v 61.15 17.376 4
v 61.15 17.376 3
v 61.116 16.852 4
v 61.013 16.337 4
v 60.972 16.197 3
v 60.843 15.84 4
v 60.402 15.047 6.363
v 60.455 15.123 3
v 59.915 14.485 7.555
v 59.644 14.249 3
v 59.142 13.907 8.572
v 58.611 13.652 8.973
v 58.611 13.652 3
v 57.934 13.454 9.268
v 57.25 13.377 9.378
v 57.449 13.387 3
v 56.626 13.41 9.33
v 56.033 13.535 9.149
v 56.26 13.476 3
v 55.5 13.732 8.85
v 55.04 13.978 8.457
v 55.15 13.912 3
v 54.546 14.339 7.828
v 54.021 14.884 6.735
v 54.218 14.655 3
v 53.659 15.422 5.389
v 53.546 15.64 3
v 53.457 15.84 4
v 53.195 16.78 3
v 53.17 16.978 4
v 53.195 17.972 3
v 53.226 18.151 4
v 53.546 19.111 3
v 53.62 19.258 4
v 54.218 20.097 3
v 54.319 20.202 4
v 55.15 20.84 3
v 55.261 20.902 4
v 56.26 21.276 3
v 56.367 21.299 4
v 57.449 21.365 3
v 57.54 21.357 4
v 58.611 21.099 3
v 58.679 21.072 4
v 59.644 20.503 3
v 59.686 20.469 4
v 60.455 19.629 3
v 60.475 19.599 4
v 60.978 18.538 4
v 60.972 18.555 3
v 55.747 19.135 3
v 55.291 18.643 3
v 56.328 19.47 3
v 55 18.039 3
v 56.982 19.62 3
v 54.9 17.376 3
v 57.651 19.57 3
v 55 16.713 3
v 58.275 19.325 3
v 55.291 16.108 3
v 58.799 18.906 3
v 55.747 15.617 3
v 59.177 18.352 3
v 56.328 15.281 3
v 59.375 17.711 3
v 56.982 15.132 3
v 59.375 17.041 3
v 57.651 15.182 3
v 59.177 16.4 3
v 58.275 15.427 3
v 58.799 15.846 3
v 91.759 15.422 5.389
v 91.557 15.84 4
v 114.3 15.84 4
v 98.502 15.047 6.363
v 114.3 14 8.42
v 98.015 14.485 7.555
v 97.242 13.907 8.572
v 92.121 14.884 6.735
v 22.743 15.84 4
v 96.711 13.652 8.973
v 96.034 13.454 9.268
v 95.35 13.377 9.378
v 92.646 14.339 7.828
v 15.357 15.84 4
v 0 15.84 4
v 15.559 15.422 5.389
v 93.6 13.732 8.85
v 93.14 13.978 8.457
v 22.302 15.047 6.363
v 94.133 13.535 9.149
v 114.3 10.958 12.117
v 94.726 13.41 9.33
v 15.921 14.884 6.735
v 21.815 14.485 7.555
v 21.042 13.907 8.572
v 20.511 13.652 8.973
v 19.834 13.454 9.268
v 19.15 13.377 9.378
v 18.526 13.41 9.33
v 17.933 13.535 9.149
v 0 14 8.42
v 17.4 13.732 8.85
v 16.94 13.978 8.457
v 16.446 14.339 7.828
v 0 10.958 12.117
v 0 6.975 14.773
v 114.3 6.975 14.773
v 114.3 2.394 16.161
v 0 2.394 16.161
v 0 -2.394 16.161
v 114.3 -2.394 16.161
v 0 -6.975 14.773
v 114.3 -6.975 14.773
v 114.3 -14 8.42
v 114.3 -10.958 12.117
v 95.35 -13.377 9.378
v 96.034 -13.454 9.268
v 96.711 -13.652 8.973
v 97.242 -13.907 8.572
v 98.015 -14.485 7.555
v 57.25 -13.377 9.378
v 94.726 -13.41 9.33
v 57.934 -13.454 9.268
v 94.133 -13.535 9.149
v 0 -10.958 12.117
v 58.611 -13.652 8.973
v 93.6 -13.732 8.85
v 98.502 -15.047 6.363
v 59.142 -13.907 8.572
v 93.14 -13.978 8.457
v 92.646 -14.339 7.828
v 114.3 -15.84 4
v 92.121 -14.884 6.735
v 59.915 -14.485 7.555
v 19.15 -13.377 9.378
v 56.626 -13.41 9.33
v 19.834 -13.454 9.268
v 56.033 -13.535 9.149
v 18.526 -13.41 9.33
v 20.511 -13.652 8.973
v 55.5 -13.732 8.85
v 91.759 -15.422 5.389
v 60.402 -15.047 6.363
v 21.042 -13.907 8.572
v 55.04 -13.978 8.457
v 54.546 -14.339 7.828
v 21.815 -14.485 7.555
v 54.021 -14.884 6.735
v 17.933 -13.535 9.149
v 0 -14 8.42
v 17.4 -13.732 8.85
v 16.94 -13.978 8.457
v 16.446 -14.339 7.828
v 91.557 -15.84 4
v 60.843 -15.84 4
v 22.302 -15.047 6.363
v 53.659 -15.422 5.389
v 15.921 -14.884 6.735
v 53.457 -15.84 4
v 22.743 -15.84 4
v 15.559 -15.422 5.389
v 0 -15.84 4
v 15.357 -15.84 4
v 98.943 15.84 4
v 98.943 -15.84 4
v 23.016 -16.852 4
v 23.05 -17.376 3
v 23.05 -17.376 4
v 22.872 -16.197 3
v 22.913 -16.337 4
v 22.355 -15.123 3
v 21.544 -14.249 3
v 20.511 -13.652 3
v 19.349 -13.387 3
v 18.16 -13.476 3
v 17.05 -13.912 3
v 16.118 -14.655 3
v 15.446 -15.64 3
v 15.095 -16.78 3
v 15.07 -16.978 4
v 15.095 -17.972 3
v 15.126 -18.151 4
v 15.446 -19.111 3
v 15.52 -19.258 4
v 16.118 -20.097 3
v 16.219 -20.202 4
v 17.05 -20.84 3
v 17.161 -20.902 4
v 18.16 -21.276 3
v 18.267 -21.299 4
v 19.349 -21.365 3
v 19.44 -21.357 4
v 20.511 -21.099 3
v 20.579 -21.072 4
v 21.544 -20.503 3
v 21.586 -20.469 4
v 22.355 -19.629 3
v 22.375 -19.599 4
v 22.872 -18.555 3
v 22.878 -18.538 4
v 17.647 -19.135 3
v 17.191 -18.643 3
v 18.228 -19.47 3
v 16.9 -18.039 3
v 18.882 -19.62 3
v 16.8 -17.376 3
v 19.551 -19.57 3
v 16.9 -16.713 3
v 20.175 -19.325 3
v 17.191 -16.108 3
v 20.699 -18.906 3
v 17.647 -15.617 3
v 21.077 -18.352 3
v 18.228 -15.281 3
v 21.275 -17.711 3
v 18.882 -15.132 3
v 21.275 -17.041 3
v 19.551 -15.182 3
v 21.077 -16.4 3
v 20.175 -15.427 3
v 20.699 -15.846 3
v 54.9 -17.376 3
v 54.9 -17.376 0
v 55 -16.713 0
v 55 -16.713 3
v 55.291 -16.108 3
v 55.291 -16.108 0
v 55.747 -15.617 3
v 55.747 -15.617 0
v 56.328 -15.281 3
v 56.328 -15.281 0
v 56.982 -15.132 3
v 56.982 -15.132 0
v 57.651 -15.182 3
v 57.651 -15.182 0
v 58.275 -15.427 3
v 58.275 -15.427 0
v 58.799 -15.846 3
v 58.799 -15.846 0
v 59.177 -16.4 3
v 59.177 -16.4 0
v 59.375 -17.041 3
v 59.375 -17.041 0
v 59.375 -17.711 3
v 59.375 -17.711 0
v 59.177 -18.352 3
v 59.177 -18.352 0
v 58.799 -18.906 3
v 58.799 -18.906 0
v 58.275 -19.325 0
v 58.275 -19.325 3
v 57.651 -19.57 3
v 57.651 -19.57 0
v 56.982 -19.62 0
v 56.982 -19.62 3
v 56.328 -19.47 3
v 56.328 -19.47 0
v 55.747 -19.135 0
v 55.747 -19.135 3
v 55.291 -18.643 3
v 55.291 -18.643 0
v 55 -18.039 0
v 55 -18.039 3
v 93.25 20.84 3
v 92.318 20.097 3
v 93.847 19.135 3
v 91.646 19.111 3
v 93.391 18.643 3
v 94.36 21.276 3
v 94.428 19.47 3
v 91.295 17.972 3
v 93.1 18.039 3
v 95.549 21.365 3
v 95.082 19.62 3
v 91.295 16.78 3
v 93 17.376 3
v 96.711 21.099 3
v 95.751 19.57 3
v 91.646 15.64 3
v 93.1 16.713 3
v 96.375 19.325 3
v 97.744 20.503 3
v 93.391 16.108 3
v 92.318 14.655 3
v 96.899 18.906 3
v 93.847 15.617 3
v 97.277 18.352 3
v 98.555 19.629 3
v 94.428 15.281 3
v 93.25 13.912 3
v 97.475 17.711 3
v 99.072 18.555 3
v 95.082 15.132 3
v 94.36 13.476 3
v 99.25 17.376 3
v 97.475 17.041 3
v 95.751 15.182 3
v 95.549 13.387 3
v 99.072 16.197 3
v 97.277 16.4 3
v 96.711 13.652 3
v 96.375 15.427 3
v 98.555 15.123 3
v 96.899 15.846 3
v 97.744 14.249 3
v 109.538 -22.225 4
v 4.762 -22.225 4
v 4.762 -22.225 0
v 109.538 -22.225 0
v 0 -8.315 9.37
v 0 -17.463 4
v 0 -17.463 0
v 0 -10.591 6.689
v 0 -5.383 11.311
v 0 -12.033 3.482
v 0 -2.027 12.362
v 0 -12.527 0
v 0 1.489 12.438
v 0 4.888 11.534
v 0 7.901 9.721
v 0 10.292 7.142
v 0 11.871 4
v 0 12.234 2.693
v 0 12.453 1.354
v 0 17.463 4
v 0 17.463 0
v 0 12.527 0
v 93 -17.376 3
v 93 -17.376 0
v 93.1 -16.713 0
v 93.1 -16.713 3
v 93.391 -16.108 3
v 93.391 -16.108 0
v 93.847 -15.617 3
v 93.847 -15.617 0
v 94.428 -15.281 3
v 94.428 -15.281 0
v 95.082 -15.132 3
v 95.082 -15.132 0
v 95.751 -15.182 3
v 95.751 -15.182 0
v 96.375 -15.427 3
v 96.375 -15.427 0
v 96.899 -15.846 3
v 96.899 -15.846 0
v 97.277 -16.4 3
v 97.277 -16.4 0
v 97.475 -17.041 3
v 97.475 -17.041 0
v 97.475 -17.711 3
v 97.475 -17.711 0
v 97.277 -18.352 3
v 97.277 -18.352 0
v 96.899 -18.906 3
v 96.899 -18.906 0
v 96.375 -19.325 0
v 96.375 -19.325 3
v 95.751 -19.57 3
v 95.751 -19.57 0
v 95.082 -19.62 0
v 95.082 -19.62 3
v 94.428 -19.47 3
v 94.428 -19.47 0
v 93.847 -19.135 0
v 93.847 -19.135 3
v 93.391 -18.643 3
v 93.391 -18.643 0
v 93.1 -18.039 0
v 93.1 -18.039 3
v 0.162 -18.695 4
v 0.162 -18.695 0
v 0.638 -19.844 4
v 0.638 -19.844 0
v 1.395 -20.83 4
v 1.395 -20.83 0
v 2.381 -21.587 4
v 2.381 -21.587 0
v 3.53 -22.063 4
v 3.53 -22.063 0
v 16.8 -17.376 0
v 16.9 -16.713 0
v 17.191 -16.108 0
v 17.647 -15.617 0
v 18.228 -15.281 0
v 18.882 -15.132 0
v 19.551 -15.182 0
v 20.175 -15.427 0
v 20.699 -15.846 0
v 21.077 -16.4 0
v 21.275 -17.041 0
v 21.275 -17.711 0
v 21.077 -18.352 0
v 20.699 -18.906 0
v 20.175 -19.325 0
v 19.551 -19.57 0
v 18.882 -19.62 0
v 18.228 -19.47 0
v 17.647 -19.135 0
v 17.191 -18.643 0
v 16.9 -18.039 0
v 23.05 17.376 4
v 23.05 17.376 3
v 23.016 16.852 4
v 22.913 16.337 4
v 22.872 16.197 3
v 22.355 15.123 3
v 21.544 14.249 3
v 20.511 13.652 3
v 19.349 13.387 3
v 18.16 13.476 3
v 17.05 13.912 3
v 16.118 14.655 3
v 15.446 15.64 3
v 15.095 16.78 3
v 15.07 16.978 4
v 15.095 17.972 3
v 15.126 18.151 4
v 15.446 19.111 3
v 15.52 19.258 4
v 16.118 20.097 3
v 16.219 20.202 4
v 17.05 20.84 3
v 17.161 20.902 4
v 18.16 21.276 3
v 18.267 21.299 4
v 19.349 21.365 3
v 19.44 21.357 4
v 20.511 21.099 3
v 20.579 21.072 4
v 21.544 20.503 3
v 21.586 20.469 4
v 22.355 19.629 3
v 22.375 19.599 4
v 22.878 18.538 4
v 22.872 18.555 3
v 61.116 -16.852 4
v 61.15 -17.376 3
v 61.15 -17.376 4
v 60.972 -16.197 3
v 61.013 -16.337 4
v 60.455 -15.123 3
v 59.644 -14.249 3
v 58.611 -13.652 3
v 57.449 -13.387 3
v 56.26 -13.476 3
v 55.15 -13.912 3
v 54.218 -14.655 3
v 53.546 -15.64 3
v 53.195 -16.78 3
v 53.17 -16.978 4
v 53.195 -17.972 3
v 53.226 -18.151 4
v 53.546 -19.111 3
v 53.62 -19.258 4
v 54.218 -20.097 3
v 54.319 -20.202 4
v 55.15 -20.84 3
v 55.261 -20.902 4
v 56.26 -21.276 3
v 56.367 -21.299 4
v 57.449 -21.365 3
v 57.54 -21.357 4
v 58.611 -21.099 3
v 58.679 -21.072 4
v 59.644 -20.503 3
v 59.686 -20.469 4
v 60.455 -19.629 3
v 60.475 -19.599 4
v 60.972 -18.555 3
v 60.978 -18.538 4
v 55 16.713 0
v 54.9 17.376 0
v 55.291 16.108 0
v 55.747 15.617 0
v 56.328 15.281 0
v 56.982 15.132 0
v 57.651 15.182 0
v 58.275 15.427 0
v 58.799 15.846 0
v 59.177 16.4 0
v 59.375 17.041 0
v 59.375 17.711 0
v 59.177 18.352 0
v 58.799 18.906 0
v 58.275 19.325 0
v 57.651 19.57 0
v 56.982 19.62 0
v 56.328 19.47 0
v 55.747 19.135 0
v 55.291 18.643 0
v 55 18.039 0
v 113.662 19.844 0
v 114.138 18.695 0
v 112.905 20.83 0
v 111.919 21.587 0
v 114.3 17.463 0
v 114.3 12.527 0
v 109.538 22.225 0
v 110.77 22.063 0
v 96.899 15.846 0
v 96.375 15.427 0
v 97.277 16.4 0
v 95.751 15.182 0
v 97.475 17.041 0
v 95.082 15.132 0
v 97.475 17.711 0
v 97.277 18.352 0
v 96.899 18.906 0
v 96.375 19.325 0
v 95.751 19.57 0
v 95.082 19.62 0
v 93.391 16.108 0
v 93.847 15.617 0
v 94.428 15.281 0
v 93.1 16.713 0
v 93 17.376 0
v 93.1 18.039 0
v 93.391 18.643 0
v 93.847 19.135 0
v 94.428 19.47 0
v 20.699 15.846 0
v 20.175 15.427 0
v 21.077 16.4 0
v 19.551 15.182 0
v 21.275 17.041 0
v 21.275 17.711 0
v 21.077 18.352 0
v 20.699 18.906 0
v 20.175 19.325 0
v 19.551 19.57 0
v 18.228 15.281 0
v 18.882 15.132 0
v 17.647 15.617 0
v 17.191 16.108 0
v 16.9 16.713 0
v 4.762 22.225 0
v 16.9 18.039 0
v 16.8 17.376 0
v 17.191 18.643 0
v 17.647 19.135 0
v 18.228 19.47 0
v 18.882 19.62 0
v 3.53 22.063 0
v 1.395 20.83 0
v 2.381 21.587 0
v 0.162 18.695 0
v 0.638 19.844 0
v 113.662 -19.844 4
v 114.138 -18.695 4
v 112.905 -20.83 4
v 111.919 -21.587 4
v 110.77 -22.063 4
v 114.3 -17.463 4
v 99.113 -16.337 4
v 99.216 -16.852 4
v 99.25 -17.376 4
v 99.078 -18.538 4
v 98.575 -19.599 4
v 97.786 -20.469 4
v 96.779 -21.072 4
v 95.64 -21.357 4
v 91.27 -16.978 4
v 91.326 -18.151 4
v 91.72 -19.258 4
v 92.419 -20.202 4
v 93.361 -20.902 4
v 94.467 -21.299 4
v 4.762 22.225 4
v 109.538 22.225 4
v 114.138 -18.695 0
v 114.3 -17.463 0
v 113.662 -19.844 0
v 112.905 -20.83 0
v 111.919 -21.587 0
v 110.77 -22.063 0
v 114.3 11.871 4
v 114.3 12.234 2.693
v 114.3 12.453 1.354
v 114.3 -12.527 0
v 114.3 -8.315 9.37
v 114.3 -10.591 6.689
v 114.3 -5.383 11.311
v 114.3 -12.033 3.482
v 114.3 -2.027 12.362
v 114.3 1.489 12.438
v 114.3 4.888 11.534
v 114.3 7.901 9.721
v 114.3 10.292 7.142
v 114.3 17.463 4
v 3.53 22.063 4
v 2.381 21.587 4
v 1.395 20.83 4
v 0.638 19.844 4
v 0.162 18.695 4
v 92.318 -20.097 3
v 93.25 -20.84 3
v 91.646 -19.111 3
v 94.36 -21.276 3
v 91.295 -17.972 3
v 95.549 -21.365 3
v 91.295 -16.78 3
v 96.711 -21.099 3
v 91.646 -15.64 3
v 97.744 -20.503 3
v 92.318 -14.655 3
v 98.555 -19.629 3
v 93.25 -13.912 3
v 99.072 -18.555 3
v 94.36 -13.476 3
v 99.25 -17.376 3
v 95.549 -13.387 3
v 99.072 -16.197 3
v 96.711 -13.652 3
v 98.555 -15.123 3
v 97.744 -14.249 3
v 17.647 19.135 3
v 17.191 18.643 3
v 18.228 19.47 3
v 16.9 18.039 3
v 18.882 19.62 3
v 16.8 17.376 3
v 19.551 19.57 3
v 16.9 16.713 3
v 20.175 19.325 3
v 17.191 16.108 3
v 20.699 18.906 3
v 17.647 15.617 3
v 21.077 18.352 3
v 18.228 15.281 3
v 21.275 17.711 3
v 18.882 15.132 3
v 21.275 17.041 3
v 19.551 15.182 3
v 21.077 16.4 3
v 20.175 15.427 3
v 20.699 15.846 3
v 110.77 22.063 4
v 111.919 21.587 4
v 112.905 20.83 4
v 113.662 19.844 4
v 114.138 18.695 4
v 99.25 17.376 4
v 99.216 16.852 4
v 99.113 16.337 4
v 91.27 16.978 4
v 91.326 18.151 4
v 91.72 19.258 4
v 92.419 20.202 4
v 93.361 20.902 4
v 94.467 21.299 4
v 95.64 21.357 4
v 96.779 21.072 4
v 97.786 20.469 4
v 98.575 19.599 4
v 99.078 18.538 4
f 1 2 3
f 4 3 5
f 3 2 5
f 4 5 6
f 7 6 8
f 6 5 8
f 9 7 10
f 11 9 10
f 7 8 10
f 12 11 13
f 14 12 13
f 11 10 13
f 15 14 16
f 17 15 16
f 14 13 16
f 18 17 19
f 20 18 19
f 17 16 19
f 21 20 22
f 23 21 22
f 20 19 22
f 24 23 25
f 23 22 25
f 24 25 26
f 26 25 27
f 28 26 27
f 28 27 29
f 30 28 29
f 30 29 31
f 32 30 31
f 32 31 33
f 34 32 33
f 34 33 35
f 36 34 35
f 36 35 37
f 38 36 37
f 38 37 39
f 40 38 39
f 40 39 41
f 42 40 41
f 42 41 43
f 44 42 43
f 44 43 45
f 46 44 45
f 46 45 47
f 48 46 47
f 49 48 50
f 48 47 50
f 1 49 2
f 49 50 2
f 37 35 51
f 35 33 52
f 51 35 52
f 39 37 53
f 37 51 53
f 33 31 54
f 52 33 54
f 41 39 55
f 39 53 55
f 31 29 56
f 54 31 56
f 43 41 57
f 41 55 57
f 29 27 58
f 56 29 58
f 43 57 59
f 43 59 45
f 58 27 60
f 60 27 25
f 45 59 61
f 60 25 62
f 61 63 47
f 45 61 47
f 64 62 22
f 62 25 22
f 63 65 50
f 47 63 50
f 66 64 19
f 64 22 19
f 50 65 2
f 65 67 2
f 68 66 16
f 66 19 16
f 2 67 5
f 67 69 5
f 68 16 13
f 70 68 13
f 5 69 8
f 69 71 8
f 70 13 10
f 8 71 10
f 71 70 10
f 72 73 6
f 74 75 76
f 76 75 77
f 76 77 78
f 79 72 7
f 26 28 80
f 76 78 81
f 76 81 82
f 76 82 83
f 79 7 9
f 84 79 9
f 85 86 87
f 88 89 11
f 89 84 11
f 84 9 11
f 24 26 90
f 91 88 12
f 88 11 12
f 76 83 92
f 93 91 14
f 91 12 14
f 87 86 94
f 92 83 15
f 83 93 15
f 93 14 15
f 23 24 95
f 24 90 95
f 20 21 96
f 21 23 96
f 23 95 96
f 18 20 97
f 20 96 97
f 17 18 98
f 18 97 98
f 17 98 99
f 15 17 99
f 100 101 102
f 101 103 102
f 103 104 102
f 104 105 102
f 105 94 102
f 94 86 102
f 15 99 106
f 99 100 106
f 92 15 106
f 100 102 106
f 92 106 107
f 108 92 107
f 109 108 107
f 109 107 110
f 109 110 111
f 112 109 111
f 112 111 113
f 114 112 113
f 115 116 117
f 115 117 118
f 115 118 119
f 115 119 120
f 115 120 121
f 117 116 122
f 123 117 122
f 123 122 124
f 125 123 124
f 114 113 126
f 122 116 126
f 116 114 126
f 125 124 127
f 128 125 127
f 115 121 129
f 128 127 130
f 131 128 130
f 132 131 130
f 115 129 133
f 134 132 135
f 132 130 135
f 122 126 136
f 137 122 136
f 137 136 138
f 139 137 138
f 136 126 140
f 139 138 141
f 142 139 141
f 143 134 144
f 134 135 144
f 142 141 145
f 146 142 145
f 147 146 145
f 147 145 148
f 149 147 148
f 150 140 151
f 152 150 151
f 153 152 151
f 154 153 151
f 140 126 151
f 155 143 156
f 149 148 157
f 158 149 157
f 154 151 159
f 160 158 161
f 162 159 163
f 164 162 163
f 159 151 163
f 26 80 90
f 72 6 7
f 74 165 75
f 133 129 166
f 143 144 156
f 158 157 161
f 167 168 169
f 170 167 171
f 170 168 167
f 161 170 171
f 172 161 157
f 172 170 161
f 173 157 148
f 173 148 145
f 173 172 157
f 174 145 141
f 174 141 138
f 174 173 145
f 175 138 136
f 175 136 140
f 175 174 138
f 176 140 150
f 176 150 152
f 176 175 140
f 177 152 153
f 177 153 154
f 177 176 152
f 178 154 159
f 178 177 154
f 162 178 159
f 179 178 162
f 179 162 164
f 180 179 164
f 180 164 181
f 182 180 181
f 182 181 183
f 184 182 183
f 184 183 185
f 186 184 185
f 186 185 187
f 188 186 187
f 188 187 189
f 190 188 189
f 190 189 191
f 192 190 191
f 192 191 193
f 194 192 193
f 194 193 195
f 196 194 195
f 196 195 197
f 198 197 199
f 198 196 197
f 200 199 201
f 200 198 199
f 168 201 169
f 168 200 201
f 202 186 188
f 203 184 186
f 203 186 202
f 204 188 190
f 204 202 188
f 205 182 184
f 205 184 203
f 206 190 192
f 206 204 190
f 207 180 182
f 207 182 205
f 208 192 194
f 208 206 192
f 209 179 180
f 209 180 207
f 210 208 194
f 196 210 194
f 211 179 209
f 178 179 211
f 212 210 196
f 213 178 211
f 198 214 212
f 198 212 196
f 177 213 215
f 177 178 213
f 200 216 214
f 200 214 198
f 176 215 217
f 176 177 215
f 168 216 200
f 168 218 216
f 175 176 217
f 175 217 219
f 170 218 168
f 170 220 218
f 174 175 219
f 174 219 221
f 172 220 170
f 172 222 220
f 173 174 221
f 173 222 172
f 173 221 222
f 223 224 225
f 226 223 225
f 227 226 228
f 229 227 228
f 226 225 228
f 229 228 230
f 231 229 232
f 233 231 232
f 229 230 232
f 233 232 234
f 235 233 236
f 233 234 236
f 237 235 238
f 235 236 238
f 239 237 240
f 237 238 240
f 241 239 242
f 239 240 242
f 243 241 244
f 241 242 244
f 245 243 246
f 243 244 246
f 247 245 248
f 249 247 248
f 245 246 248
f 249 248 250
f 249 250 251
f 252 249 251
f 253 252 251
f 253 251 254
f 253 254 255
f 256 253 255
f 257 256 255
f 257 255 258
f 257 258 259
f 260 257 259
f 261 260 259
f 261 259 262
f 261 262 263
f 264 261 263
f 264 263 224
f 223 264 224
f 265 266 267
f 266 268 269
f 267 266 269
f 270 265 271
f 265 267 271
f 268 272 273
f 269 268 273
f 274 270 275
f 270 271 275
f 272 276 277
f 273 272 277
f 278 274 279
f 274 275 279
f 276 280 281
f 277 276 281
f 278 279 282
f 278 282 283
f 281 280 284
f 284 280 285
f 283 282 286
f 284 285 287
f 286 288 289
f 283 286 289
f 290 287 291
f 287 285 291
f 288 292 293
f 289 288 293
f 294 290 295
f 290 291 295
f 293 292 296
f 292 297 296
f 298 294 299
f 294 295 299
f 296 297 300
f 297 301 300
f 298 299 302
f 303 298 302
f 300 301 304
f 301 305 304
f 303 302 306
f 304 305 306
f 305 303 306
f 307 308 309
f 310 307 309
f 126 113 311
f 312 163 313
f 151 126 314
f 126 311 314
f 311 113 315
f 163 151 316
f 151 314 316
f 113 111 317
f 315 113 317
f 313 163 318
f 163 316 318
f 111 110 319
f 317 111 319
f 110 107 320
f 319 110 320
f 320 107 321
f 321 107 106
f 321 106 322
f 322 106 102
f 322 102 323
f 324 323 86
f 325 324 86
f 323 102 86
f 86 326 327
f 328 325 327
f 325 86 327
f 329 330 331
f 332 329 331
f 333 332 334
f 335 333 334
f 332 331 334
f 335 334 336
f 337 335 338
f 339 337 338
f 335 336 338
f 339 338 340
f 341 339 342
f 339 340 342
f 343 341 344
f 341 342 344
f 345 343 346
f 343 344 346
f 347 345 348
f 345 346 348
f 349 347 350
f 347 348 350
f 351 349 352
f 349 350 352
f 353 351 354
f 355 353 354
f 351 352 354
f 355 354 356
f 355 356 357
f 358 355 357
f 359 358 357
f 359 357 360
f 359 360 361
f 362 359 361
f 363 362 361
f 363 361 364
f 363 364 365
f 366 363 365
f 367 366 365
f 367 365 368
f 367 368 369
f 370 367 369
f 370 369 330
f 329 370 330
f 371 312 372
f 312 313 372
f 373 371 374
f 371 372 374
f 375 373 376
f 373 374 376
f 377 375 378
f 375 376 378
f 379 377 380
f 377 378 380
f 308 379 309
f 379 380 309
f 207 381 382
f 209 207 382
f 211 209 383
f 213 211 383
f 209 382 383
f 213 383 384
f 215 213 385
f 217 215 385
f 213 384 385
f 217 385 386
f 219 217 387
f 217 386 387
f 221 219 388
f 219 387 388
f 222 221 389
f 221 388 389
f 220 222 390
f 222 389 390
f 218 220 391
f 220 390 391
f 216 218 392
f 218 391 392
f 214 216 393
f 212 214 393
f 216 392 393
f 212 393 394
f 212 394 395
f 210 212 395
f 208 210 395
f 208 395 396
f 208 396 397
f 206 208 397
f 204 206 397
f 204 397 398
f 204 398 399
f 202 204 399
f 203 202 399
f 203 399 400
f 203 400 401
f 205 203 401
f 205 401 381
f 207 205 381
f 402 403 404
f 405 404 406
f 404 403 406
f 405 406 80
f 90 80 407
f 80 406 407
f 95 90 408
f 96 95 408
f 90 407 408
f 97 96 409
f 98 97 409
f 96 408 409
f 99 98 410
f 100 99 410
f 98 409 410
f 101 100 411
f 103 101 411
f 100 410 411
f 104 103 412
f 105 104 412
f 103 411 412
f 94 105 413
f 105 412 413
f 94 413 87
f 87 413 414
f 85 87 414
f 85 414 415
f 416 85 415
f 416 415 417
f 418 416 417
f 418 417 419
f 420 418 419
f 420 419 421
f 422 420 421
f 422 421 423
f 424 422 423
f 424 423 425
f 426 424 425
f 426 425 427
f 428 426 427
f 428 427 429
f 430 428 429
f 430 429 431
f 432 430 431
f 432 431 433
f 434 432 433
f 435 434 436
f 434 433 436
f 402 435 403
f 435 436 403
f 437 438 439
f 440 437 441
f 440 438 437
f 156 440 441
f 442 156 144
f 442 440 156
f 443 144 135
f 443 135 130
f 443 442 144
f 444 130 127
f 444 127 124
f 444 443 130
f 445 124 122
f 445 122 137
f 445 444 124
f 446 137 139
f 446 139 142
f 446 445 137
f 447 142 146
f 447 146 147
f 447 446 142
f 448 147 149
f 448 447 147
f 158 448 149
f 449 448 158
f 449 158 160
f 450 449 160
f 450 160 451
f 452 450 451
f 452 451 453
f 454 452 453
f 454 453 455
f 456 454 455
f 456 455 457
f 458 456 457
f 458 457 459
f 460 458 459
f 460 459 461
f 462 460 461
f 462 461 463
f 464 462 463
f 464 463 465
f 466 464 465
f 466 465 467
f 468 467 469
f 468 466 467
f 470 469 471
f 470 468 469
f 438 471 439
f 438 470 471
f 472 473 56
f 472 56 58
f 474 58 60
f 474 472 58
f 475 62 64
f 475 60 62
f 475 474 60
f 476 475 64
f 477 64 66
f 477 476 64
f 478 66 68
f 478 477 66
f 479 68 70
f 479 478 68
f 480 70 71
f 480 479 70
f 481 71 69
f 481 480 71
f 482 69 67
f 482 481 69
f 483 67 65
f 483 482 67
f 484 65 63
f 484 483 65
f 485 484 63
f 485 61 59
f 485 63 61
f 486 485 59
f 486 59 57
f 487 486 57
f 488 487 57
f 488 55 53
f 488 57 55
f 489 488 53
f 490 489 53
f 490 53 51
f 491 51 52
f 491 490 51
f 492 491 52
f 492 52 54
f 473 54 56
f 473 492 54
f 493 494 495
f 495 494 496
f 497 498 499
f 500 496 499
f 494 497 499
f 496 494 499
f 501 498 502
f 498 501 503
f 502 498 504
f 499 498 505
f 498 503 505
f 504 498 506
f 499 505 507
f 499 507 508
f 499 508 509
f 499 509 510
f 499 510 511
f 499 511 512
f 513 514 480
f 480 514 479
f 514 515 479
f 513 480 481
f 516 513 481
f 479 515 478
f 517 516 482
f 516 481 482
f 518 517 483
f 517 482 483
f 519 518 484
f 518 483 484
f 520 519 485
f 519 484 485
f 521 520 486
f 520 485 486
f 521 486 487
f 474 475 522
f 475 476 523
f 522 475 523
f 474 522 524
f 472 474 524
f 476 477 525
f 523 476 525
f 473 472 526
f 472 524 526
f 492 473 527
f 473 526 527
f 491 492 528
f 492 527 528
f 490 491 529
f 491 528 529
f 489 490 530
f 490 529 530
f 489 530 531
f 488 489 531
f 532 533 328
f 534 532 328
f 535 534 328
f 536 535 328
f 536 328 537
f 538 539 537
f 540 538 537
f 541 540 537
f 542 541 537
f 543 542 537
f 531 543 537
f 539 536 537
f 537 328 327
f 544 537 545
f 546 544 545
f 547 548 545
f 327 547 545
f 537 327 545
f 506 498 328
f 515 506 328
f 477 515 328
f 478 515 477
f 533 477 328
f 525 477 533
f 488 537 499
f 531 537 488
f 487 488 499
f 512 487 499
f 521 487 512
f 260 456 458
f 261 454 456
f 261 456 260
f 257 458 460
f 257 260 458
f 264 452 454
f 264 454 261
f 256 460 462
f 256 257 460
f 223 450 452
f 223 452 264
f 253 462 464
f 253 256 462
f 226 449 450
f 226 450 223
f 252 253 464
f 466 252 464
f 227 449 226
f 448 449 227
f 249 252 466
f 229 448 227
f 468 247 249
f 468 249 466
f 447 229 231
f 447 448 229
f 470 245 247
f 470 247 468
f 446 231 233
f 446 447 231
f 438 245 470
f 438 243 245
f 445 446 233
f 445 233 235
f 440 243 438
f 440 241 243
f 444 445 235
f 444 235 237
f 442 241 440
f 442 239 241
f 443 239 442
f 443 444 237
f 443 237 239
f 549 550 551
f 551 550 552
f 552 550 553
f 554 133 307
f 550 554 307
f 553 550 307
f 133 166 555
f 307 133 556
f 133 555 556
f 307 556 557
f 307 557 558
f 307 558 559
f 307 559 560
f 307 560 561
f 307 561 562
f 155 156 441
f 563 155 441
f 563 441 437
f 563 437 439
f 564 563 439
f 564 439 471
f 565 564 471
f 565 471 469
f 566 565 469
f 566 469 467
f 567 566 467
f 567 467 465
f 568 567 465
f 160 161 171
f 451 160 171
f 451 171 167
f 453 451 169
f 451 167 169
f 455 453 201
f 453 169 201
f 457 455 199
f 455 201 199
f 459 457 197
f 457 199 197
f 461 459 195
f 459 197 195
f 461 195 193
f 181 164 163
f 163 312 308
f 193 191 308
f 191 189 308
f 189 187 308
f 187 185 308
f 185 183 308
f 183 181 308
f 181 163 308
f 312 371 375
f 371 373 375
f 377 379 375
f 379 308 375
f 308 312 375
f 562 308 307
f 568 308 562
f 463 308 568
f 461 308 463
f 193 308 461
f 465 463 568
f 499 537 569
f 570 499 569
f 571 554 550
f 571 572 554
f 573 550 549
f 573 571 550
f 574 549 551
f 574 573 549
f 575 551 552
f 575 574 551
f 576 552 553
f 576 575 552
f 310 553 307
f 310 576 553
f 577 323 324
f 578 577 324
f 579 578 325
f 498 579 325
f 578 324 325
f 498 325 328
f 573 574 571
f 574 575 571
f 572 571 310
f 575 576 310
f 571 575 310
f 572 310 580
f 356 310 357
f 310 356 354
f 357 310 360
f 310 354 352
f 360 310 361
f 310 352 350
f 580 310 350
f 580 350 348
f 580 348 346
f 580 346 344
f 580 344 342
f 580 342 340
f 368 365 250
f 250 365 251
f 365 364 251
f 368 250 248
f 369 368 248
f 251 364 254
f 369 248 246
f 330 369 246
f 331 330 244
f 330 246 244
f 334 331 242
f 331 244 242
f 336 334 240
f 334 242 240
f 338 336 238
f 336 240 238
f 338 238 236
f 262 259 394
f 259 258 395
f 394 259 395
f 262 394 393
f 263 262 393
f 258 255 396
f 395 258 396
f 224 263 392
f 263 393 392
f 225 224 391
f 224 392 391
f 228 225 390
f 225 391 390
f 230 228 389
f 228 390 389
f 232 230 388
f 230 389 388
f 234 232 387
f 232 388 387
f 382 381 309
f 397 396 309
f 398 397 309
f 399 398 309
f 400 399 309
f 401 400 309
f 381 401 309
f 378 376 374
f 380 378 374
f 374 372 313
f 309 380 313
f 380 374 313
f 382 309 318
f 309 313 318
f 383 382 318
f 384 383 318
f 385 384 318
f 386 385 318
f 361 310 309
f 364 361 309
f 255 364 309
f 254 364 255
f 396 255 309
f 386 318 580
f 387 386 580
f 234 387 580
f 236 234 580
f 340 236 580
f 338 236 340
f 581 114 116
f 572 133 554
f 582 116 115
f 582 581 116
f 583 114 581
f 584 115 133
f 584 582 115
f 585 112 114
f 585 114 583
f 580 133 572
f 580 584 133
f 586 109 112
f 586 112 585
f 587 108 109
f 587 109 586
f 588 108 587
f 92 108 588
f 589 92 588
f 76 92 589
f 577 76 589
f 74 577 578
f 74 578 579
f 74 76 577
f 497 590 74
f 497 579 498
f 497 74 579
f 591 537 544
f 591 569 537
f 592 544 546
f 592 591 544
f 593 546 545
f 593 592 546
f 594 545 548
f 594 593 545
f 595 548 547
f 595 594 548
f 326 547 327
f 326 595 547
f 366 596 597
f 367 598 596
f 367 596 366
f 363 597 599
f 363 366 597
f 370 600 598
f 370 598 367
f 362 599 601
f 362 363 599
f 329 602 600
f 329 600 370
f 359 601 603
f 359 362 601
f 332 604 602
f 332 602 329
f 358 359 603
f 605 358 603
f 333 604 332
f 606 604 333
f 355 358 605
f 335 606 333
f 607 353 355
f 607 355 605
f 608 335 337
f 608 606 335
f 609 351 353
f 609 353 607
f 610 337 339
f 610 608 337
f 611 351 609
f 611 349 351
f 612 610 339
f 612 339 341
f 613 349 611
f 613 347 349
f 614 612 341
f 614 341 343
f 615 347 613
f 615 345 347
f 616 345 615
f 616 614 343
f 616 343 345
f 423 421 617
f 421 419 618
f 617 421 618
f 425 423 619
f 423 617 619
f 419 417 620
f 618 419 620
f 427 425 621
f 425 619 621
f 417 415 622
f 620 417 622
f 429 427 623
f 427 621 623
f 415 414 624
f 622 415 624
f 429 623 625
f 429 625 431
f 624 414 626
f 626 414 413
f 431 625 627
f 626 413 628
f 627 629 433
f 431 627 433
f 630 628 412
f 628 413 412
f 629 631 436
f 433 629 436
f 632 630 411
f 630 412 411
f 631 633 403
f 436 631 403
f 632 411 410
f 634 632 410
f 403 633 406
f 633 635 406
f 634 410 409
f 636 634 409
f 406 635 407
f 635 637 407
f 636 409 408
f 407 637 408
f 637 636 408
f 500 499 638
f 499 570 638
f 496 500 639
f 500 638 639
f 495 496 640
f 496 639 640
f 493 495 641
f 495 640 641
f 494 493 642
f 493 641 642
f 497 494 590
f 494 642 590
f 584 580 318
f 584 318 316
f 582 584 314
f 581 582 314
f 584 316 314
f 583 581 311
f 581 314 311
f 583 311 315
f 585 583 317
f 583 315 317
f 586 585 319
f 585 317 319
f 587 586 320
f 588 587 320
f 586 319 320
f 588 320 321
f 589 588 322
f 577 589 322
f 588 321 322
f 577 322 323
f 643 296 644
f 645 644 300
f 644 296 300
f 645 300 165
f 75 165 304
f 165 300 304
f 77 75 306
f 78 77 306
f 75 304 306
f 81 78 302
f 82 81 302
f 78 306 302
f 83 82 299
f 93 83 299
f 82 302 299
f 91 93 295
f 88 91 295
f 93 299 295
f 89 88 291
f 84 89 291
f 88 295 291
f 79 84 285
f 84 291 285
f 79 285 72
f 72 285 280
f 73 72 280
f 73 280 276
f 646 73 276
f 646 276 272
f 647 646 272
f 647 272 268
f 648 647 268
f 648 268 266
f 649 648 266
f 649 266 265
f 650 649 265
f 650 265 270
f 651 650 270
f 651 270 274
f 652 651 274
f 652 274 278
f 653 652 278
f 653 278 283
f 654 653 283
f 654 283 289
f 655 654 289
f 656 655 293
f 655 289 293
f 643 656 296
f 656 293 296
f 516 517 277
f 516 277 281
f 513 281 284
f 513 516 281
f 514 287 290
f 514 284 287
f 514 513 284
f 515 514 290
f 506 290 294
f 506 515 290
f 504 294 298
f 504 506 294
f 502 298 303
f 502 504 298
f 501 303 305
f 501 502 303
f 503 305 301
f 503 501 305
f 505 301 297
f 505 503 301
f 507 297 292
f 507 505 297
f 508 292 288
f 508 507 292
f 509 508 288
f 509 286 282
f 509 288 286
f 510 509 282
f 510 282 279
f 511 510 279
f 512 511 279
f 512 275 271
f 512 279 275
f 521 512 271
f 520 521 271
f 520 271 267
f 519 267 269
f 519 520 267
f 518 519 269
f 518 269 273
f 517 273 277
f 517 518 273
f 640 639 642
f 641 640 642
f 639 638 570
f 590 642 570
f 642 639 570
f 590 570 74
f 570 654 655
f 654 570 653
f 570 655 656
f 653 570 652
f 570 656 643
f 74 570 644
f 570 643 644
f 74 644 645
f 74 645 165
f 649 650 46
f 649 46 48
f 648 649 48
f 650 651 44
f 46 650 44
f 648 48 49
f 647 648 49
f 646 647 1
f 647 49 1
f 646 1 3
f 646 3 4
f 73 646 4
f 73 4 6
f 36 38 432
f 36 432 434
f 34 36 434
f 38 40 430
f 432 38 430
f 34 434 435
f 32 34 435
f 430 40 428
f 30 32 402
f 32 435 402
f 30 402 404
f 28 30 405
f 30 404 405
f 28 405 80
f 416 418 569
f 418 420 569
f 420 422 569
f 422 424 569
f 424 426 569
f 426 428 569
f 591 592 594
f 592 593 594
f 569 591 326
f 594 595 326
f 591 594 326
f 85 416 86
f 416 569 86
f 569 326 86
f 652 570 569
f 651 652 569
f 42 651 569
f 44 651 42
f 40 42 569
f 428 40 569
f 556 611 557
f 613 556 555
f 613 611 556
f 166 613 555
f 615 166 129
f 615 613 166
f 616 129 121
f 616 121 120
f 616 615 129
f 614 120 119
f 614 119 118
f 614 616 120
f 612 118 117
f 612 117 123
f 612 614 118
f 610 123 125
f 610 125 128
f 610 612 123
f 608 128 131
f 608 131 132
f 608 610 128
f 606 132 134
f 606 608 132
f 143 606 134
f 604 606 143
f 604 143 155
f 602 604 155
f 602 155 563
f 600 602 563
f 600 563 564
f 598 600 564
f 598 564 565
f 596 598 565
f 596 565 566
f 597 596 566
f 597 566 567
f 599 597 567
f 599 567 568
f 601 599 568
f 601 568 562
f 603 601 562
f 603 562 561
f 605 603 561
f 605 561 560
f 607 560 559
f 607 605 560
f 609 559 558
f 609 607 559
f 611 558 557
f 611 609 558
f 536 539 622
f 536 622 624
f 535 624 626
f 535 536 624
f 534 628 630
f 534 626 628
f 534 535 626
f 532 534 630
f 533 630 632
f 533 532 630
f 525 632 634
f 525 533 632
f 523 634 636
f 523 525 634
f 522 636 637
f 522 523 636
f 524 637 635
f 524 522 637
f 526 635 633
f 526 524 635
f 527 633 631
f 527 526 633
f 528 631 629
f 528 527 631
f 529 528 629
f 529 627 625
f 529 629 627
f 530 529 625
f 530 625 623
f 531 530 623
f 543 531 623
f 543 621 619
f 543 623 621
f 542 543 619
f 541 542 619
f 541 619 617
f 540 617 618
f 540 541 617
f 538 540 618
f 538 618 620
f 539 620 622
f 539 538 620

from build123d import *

# Parameters (mm, degrees)
BOSS_EXTRUDE1_DEPTH  = 114.3
CUT_EXTRUDE1_START   = -1
SKETCH2_R            = 4
CUT_EXTRUDE1_DEPTH   = 7.35
M4_CLEARANCE_HOLE1_D = 4.5
FILLET1_R            = 4.7625


with BuildPart() as part:
    # Sketch1 → Boss-Extrude1 (new body)
    with BuildSketch(Plane(origin=(0, 0, 0), x_dir=(0, 0, -1), z_dir=(1, 0, 0))):
        with BuildLine():
            Line((0, 22.225), (-4, 22.225))
            Line((-4, 22.225), (-4, 15.839643355))
            ThreePointArc((-4, 15.839643355), (-2.015394761, 16.212109226), (0, 16.3369))
            Line((0, 16.3369), (0, 17.4625))
            Line((0, 17.4625), (0, 22.225))
        make_face()
        with BuildLine():
            ThreePointArc((0, 16.3369), (-2.015394761, 16.212109226), (-4, 15.839643355))
            ThreePointArc((-4, 15.839643355), (-16.3369, 0), (-4, -15.839643355))
            ThreePointArc((-4, -15.839643355), (-2.015394761, -16.212109226), (0, -16.3369))
            Line((0, -16.3369), (0, -12.5269))
            ThreePointArc((0, -12.5269), (-12.361865073, -2.026700652), (-4, 11.871108778))
            ThreePointArc((-4, 11.871108778), (-2.026700652, 12.361865073), (0, 12.5269))
            Line((0, 12.5269), (0, 16.3369))
        make_face()
        with BuildLine():
            ThreePointArc((0, -16.3369), (-2.015394761, -16.212109226), (-4, -15.839643355))
            Line((-4, -15.839643355), (-4, -22.225))
            Line((-4, -22.225), (0, -22.225))
            Line((0, -22.225), (0, -17.4625))
            Line((0, -17.4625), (0, -16.3369))
        make_face()
    extrude(amount=BOSS_EXTRUDE1_DEPTH)

    # Sketch2 → Cut-Extrude1 (cut)
    with BuildSketch(Plane.XY.offset(4).offset(CUT_EXTRUDE1_START)):
        with Locations((19.05, -17.37595)):
            Circle(SKETCH2_R)
        with Locations((57.15, -17.37595)):
            Circle(SKETCH2_R)
        with Locations((95.25, -17.37595)):
            Circle(SKETCH2_R)
    cut_extrude1 = extrude(amount=CUT_EXTRUDE1_DEPTH, mode=Mode.SUBTRACT)

    # M4 Clearance Hole1 (through all)
    with Locations(Plane.XY.offset(4)):
        with Locations((19.05, -17.37595), (57.15, -17.37595), (95.25, -17.37595)):
            m4_clearance_hole1 = Hole(M4_CLEARANCE_HOLE1_D / 2)

    # Mirror1: Cut-Extrude1, M4 Clearance Hole1 across plane
    add(cut_extrude1.mirror(Plane.ZX), mode=Mode.SUBTRACT)
    add(m4_clearance_hole1.mirror(Plane.ZX), mode=Mode.SUBTRACT)

    # Fillet1
    fillet1_edges = [part.edges().sort_by_distance(p)[0] for p in [
        (0, 22.225, 2),
        (0, -22.225, 2),
        (114.3, -22.225, 2),
        (114.3, 22.225, 2),
    ]]
    fillet(fillet1_edges, radius=FILLET1_R)


solid = part.part
